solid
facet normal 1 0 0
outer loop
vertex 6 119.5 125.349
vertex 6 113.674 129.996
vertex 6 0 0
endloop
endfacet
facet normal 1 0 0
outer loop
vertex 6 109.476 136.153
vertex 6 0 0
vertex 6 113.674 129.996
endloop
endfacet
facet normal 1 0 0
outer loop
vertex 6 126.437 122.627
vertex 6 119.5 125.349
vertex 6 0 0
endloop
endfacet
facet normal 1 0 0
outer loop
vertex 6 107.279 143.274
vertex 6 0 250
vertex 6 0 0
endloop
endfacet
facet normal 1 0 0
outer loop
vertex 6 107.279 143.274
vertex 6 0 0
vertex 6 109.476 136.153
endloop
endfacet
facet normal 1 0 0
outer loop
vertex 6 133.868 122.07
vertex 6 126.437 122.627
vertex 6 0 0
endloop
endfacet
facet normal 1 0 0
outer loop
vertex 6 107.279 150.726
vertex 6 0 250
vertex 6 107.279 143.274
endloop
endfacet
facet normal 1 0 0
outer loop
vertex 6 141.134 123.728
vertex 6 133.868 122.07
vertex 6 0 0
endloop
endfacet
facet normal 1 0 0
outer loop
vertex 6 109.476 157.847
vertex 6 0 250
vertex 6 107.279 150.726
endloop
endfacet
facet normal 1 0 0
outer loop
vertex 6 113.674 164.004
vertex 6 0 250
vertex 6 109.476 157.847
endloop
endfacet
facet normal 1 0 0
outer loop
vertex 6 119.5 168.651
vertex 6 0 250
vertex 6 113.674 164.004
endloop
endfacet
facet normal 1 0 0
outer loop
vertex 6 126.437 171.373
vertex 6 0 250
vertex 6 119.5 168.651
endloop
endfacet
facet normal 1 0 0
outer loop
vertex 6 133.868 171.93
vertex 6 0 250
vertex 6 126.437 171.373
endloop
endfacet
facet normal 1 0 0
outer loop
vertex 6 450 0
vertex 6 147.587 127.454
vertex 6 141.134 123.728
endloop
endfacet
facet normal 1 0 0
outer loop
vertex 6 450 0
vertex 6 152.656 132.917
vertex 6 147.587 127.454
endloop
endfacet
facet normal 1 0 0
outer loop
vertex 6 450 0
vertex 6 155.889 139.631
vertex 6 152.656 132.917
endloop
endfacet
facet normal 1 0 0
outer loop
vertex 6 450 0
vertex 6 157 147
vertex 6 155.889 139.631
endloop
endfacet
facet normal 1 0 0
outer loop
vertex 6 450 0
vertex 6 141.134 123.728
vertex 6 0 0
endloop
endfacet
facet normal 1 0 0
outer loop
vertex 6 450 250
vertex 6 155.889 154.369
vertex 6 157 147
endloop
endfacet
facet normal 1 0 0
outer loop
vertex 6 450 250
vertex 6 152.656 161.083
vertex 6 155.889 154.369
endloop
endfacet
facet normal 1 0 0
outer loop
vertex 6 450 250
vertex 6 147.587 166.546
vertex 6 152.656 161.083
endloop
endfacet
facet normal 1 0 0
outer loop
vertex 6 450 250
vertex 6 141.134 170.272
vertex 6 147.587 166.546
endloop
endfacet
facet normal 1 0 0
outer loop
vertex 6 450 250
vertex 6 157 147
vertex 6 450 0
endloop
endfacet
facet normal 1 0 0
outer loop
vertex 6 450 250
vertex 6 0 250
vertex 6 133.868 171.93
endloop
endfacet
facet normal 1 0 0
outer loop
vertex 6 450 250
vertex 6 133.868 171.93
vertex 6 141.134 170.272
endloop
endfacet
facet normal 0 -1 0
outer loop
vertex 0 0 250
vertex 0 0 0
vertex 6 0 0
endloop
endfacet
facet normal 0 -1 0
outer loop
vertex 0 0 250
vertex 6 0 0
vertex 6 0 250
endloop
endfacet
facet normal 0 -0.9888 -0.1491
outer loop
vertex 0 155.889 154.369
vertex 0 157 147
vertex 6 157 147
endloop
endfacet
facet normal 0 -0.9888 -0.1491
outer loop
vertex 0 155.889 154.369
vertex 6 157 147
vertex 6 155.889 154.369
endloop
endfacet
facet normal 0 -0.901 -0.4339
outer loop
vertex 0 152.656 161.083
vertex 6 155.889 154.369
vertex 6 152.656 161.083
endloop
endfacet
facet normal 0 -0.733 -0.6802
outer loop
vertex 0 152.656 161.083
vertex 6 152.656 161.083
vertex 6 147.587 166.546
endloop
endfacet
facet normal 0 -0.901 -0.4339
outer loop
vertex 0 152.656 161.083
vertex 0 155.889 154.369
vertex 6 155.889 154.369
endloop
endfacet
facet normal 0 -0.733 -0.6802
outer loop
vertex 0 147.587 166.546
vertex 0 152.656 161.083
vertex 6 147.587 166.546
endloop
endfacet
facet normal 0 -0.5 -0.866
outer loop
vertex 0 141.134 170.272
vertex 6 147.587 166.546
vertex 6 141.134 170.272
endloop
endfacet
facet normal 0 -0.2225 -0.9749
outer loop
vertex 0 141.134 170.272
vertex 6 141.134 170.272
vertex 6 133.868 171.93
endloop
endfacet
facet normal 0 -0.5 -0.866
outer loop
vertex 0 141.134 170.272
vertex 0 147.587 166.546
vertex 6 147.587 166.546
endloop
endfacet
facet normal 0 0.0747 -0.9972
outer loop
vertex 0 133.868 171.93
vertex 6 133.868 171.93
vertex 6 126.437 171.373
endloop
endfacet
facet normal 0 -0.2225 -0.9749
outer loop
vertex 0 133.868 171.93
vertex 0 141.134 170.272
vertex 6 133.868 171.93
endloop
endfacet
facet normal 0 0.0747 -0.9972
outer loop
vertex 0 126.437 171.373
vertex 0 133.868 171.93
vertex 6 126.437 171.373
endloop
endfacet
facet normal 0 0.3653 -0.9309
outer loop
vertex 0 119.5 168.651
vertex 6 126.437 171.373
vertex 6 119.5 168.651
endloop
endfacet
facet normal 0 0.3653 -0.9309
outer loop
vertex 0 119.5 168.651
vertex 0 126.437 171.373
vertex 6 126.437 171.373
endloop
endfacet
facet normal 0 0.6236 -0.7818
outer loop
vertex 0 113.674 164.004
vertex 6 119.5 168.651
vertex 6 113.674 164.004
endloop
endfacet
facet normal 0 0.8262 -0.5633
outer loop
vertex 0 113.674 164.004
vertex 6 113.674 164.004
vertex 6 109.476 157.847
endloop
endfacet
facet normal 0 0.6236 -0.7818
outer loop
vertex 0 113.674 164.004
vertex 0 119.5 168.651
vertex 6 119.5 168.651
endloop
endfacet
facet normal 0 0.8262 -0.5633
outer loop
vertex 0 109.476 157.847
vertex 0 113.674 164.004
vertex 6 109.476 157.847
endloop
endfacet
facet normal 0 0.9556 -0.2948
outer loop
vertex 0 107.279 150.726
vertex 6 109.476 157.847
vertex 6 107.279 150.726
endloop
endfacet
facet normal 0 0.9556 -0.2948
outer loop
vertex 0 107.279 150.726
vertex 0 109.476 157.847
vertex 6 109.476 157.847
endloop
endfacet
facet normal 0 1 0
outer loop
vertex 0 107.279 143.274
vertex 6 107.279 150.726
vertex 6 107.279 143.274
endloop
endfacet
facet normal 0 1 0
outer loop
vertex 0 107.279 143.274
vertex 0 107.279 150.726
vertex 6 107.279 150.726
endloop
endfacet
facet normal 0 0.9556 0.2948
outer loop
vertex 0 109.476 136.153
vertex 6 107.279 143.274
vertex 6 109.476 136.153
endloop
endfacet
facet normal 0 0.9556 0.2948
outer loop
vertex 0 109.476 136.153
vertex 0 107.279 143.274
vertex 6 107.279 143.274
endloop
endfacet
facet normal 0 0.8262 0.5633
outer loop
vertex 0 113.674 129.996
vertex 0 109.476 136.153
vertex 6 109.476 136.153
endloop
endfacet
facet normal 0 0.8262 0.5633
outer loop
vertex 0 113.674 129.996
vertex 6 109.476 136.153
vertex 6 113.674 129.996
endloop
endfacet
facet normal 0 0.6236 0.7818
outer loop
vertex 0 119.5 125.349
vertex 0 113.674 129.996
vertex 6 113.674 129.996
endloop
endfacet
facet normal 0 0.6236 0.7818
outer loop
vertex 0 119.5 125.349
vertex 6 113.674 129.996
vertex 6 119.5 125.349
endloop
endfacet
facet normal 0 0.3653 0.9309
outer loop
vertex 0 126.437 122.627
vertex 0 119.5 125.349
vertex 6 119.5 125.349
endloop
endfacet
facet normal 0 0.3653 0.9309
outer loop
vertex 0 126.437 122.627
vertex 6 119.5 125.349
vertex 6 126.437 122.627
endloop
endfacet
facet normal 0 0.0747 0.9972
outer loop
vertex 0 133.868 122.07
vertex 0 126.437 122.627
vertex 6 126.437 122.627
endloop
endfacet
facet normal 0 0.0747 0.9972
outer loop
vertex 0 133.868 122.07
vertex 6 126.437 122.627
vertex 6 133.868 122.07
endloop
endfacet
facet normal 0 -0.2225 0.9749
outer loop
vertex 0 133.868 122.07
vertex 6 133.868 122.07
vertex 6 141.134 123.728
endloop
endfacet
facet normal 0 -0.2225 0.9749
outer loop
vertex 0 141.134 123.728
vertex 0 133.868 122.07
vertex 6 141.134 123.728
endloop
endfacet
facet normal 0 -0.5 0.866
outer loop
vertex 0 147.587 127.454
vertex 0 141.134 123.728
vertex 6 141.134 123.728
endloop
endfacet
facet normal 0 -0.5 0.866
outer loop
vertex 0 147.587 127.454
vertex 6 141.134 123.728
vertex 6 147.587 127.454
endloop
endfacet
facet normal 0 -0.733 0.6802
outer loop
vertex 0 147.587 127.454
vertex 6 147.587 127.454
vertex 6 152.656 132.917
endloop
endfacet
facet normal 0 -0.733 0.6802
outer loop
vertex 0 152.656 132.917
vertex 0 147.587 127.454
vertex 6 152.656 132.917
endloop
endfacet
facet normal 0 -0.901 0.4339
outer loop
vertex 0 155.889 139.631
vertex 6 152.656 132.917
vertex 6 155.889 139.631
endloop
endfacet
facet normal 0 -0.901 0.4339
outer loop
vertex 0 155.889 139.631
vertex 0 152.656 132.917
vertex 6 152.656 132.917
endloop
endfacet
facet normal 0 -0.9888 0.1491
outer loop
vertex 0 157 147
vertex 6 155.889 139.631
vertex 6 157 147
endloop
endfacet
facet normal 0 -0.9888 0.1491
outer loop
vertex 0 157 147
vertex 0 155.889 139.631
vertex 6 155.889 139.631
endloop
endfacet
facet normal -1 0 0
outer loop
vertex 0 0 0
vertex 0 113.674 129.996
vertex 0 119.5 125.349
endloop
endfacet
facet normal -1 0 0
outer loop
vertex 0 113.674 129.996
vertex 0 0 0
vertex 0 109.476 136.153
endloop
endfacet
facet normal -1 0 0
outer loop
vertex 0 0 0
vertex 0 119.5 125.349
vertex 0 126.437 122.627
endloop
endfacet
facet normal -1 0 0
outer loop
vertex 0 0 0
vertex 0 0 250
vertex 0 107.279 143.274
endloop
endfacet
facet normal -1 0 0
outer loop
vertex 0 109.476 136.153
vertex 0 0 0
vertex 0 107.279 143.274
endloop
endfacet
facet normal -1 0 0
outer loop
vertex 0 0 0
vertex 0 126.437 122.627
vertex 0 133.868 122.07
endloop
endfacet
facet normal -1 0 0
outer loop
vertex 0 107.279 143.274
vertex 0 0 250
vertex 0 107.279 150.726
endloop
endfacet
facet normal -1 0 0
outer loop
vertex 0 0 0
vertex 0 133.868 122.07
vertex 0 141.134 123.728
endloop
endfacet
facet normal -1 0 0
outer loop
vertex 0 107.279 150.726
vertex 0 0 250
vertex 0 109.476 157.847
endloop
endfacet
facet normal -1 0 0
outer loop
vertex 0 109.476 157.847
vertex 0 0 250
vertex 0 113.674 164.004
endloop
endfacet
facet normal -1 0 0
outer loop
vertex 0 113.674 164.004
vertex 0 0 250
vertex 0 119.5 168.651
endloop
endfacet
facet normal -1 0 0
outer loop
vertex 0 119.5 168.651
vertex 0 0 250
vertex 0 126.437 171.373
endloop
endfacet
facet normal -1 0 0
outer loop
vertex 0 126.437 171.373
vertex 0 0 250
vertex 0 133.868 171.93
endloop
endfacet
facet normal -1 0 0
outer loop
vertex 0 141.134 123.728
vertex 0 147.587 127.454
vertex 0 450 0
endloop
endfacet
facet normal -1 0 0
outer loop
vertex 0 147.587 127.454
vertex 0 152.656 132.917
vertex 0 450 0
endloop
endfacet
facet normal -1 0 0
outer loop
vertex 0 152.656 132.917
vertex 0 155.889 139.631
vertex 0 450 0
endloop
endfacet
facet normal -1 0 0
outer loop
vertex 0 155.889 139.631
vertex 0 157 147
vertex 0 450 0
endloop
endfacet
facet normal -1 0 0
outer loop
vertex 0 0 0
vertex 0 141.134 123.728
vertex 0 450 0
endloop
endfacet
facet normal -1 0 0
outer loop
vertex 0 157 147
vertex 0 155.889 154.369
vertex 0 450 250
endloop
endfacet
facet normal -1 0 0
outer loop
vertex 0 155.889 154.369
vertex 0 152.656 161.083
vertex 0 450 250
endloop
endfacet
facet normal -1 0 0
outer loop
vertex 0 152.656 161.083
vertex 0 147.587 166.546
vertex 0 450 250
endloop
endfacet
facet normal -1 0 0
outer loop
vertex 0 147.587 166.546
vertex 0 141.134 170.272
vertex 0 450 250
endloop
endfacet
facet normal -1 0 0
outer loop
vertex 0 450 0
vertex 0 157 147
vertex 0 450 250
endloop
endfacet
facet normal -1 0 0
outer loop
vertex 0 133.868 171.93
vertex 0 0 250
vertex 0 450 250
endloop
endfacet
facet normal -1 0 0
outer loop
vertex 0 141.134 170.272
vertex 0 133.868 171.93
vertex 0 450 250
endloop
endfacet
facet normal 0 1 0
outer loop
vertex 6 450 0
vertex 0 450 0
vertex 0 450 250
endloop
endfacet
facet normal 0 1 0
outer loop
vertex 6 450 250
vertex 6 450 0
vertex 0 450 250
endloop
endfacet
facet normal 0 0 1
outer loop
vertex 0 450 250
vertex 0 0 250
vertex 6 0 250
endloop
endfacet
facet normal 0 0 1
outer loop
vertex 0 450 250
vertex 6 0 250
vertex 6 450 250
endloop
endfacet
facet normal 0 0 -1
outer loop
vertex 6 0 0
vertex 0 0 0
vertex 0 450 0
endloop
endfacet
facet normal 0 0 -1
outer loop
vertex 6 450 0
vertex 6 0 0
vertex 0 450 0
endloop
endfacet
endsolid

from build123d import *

# Parameters (mm, degrees)
SKETCH_W  = 450
SKETCH_H  = 250
SKETCH_R  = 25
PAD_DEPTH = 6


with BuildPart() as part:
    # Sketch → Pad (new body)
    with BuildSketch(Plane.YZ):
        with Locations((225, 125)):
            Rectangle(SKETCH_W, SKETCH_H)
        with Locations((132, 147)):
            Circle(SKETCH_R, mode=Mode.SUBTRACT)
    extrude(amount=PAD_DEPTH)


solid = part.part
